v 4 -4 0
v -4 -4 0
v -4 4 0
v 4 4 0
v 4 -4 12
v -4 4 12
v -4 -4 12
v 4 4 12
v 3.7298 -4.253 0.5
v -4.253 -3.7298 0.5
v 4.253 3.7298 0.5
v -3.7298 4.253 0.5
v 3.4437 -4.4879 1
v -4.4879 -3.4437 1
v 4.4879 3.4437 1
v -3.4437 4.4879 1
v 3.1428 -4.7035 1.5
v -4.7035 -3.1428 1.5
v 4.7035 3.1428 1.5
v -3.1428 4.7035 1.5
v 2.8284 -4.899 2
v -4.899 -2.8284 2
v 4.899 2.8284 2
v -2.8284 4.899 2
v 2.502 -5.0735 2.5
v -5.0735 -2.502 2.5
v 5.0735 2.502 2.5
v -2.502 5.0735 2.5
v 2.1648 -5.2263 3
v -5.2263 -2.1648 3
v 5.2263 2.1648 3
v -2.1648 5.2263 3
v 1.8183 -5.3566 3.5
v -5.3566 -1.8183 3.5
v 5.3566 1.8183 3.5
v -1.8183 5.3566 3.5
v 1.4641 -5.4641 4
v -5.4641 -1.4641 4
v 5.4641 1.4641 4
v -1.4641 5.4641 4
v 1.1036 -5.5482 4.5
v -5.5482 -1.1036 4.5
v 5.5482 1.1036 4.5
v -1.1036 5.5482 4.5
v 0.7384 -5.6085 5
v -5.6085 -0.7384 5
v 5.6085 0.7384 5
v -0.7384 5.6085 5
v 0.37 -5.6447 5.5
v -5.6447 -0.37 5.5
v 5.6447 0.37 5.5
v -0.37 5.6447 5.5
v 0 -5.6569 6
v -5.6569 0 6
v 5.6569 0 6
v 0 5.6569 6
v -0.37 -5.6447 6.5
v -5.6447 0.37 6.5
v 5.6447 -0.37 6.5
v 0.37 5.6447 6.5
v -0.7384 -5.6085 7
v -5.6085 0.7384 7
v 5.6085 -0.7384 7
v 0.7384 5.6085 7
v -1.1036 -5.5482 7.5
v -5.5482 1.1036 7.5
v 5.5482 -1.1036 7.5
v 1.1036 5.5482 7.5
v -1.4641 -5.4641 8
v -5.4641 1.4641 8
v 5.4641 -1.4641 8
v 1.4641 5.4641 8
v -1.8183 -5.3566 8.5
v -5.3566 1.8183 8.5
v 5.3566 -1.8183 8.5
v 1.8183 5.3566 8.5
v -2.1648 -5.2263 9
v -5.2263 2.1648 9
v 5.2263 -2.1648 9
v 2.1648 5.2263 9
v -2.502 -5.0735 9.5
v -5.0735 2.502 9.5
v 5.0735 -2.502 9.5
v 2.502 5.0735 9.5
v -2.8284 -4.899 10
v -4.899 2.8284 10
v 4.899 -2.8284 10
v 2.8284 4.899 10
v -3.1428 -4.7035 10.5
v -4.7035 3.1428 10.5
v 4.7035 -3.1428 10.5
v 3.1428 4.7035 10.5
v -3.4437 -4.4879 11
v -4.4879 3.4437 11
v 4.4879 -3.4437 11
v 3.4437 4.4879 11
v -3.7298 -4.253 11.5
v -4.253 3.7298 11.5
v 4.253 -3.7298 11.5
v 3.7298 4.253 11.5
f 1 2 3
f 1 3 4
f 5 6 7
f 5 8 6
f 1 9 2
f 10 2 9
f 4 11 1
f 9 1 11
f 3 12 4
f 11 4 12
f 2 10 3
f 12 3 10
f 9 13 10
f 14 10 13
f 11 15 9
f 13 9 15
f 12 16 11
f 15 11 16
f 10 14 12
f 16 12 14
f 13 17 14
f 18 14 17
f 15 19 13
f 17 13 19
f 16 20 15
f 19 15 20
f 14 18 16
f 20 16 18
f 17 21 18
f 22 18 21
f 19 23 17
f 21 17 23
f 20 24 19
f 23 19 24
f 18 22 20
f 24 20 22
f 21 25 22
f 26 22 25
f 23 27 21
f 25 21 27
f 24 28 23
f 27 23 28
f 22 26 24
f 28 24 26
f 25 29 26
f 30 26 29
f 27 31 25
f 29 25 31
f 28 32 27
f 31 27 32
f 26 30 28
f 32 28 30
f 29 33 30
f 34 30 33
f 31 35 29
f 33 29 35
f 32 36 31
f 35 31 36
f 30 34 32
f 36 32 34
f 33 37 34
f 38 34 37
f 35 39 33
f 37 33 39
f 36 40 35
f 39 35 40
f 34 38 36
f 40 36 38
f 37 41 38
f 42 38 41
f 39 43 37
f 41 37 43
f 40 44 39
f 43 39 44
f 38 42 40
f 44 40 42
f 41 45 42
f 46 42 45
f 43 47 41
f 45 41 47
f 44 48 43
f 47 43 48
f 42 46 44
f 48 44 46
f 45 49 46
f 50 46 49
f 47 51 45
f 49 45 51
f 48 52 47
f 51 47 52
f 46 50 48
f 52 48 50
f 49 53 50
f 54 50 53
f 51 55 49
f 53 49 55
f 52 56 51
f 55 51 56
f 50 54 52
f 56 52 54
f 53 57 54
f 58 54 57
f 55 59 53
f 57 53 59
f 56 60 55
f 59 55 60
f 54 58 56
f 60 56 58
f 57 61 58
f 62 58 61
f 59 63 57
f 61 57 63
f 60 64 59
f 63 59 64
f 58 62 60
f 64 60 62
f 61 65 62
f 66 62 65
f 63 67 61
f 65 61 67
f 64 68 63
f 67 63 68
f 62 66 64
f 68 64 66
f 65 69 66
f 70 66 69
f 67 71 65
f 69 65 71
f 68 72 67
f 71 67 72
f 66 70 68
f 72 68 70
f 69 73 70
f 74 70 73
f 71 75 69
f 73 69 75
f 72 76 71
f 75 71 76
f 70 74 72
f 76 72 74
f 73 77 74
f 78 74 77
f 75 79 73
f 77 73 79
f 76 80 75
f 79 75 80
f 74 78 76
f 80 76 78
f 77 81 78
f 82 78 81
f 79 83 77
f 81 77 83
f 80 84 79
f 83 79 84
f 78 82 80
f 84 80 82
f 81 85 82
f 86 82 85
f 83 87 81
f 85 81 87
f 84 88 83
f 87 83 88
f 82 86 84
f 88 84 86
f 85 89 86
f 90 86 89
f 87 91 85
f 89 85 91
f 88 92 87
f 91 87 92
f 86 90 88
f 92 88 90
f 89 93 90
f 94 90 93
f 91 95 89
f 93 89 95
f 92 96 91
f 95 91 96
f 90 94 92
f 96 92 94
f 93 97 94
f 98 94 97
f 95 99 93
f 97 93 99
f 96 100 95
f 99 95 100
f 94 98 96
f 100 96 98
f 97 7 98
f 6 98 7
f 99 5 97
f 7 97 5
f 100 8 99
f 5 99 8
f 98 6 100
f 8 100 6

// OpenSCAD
linear_extrude(height = 12, twist = 90, slices = 24) square(8, center = true);
